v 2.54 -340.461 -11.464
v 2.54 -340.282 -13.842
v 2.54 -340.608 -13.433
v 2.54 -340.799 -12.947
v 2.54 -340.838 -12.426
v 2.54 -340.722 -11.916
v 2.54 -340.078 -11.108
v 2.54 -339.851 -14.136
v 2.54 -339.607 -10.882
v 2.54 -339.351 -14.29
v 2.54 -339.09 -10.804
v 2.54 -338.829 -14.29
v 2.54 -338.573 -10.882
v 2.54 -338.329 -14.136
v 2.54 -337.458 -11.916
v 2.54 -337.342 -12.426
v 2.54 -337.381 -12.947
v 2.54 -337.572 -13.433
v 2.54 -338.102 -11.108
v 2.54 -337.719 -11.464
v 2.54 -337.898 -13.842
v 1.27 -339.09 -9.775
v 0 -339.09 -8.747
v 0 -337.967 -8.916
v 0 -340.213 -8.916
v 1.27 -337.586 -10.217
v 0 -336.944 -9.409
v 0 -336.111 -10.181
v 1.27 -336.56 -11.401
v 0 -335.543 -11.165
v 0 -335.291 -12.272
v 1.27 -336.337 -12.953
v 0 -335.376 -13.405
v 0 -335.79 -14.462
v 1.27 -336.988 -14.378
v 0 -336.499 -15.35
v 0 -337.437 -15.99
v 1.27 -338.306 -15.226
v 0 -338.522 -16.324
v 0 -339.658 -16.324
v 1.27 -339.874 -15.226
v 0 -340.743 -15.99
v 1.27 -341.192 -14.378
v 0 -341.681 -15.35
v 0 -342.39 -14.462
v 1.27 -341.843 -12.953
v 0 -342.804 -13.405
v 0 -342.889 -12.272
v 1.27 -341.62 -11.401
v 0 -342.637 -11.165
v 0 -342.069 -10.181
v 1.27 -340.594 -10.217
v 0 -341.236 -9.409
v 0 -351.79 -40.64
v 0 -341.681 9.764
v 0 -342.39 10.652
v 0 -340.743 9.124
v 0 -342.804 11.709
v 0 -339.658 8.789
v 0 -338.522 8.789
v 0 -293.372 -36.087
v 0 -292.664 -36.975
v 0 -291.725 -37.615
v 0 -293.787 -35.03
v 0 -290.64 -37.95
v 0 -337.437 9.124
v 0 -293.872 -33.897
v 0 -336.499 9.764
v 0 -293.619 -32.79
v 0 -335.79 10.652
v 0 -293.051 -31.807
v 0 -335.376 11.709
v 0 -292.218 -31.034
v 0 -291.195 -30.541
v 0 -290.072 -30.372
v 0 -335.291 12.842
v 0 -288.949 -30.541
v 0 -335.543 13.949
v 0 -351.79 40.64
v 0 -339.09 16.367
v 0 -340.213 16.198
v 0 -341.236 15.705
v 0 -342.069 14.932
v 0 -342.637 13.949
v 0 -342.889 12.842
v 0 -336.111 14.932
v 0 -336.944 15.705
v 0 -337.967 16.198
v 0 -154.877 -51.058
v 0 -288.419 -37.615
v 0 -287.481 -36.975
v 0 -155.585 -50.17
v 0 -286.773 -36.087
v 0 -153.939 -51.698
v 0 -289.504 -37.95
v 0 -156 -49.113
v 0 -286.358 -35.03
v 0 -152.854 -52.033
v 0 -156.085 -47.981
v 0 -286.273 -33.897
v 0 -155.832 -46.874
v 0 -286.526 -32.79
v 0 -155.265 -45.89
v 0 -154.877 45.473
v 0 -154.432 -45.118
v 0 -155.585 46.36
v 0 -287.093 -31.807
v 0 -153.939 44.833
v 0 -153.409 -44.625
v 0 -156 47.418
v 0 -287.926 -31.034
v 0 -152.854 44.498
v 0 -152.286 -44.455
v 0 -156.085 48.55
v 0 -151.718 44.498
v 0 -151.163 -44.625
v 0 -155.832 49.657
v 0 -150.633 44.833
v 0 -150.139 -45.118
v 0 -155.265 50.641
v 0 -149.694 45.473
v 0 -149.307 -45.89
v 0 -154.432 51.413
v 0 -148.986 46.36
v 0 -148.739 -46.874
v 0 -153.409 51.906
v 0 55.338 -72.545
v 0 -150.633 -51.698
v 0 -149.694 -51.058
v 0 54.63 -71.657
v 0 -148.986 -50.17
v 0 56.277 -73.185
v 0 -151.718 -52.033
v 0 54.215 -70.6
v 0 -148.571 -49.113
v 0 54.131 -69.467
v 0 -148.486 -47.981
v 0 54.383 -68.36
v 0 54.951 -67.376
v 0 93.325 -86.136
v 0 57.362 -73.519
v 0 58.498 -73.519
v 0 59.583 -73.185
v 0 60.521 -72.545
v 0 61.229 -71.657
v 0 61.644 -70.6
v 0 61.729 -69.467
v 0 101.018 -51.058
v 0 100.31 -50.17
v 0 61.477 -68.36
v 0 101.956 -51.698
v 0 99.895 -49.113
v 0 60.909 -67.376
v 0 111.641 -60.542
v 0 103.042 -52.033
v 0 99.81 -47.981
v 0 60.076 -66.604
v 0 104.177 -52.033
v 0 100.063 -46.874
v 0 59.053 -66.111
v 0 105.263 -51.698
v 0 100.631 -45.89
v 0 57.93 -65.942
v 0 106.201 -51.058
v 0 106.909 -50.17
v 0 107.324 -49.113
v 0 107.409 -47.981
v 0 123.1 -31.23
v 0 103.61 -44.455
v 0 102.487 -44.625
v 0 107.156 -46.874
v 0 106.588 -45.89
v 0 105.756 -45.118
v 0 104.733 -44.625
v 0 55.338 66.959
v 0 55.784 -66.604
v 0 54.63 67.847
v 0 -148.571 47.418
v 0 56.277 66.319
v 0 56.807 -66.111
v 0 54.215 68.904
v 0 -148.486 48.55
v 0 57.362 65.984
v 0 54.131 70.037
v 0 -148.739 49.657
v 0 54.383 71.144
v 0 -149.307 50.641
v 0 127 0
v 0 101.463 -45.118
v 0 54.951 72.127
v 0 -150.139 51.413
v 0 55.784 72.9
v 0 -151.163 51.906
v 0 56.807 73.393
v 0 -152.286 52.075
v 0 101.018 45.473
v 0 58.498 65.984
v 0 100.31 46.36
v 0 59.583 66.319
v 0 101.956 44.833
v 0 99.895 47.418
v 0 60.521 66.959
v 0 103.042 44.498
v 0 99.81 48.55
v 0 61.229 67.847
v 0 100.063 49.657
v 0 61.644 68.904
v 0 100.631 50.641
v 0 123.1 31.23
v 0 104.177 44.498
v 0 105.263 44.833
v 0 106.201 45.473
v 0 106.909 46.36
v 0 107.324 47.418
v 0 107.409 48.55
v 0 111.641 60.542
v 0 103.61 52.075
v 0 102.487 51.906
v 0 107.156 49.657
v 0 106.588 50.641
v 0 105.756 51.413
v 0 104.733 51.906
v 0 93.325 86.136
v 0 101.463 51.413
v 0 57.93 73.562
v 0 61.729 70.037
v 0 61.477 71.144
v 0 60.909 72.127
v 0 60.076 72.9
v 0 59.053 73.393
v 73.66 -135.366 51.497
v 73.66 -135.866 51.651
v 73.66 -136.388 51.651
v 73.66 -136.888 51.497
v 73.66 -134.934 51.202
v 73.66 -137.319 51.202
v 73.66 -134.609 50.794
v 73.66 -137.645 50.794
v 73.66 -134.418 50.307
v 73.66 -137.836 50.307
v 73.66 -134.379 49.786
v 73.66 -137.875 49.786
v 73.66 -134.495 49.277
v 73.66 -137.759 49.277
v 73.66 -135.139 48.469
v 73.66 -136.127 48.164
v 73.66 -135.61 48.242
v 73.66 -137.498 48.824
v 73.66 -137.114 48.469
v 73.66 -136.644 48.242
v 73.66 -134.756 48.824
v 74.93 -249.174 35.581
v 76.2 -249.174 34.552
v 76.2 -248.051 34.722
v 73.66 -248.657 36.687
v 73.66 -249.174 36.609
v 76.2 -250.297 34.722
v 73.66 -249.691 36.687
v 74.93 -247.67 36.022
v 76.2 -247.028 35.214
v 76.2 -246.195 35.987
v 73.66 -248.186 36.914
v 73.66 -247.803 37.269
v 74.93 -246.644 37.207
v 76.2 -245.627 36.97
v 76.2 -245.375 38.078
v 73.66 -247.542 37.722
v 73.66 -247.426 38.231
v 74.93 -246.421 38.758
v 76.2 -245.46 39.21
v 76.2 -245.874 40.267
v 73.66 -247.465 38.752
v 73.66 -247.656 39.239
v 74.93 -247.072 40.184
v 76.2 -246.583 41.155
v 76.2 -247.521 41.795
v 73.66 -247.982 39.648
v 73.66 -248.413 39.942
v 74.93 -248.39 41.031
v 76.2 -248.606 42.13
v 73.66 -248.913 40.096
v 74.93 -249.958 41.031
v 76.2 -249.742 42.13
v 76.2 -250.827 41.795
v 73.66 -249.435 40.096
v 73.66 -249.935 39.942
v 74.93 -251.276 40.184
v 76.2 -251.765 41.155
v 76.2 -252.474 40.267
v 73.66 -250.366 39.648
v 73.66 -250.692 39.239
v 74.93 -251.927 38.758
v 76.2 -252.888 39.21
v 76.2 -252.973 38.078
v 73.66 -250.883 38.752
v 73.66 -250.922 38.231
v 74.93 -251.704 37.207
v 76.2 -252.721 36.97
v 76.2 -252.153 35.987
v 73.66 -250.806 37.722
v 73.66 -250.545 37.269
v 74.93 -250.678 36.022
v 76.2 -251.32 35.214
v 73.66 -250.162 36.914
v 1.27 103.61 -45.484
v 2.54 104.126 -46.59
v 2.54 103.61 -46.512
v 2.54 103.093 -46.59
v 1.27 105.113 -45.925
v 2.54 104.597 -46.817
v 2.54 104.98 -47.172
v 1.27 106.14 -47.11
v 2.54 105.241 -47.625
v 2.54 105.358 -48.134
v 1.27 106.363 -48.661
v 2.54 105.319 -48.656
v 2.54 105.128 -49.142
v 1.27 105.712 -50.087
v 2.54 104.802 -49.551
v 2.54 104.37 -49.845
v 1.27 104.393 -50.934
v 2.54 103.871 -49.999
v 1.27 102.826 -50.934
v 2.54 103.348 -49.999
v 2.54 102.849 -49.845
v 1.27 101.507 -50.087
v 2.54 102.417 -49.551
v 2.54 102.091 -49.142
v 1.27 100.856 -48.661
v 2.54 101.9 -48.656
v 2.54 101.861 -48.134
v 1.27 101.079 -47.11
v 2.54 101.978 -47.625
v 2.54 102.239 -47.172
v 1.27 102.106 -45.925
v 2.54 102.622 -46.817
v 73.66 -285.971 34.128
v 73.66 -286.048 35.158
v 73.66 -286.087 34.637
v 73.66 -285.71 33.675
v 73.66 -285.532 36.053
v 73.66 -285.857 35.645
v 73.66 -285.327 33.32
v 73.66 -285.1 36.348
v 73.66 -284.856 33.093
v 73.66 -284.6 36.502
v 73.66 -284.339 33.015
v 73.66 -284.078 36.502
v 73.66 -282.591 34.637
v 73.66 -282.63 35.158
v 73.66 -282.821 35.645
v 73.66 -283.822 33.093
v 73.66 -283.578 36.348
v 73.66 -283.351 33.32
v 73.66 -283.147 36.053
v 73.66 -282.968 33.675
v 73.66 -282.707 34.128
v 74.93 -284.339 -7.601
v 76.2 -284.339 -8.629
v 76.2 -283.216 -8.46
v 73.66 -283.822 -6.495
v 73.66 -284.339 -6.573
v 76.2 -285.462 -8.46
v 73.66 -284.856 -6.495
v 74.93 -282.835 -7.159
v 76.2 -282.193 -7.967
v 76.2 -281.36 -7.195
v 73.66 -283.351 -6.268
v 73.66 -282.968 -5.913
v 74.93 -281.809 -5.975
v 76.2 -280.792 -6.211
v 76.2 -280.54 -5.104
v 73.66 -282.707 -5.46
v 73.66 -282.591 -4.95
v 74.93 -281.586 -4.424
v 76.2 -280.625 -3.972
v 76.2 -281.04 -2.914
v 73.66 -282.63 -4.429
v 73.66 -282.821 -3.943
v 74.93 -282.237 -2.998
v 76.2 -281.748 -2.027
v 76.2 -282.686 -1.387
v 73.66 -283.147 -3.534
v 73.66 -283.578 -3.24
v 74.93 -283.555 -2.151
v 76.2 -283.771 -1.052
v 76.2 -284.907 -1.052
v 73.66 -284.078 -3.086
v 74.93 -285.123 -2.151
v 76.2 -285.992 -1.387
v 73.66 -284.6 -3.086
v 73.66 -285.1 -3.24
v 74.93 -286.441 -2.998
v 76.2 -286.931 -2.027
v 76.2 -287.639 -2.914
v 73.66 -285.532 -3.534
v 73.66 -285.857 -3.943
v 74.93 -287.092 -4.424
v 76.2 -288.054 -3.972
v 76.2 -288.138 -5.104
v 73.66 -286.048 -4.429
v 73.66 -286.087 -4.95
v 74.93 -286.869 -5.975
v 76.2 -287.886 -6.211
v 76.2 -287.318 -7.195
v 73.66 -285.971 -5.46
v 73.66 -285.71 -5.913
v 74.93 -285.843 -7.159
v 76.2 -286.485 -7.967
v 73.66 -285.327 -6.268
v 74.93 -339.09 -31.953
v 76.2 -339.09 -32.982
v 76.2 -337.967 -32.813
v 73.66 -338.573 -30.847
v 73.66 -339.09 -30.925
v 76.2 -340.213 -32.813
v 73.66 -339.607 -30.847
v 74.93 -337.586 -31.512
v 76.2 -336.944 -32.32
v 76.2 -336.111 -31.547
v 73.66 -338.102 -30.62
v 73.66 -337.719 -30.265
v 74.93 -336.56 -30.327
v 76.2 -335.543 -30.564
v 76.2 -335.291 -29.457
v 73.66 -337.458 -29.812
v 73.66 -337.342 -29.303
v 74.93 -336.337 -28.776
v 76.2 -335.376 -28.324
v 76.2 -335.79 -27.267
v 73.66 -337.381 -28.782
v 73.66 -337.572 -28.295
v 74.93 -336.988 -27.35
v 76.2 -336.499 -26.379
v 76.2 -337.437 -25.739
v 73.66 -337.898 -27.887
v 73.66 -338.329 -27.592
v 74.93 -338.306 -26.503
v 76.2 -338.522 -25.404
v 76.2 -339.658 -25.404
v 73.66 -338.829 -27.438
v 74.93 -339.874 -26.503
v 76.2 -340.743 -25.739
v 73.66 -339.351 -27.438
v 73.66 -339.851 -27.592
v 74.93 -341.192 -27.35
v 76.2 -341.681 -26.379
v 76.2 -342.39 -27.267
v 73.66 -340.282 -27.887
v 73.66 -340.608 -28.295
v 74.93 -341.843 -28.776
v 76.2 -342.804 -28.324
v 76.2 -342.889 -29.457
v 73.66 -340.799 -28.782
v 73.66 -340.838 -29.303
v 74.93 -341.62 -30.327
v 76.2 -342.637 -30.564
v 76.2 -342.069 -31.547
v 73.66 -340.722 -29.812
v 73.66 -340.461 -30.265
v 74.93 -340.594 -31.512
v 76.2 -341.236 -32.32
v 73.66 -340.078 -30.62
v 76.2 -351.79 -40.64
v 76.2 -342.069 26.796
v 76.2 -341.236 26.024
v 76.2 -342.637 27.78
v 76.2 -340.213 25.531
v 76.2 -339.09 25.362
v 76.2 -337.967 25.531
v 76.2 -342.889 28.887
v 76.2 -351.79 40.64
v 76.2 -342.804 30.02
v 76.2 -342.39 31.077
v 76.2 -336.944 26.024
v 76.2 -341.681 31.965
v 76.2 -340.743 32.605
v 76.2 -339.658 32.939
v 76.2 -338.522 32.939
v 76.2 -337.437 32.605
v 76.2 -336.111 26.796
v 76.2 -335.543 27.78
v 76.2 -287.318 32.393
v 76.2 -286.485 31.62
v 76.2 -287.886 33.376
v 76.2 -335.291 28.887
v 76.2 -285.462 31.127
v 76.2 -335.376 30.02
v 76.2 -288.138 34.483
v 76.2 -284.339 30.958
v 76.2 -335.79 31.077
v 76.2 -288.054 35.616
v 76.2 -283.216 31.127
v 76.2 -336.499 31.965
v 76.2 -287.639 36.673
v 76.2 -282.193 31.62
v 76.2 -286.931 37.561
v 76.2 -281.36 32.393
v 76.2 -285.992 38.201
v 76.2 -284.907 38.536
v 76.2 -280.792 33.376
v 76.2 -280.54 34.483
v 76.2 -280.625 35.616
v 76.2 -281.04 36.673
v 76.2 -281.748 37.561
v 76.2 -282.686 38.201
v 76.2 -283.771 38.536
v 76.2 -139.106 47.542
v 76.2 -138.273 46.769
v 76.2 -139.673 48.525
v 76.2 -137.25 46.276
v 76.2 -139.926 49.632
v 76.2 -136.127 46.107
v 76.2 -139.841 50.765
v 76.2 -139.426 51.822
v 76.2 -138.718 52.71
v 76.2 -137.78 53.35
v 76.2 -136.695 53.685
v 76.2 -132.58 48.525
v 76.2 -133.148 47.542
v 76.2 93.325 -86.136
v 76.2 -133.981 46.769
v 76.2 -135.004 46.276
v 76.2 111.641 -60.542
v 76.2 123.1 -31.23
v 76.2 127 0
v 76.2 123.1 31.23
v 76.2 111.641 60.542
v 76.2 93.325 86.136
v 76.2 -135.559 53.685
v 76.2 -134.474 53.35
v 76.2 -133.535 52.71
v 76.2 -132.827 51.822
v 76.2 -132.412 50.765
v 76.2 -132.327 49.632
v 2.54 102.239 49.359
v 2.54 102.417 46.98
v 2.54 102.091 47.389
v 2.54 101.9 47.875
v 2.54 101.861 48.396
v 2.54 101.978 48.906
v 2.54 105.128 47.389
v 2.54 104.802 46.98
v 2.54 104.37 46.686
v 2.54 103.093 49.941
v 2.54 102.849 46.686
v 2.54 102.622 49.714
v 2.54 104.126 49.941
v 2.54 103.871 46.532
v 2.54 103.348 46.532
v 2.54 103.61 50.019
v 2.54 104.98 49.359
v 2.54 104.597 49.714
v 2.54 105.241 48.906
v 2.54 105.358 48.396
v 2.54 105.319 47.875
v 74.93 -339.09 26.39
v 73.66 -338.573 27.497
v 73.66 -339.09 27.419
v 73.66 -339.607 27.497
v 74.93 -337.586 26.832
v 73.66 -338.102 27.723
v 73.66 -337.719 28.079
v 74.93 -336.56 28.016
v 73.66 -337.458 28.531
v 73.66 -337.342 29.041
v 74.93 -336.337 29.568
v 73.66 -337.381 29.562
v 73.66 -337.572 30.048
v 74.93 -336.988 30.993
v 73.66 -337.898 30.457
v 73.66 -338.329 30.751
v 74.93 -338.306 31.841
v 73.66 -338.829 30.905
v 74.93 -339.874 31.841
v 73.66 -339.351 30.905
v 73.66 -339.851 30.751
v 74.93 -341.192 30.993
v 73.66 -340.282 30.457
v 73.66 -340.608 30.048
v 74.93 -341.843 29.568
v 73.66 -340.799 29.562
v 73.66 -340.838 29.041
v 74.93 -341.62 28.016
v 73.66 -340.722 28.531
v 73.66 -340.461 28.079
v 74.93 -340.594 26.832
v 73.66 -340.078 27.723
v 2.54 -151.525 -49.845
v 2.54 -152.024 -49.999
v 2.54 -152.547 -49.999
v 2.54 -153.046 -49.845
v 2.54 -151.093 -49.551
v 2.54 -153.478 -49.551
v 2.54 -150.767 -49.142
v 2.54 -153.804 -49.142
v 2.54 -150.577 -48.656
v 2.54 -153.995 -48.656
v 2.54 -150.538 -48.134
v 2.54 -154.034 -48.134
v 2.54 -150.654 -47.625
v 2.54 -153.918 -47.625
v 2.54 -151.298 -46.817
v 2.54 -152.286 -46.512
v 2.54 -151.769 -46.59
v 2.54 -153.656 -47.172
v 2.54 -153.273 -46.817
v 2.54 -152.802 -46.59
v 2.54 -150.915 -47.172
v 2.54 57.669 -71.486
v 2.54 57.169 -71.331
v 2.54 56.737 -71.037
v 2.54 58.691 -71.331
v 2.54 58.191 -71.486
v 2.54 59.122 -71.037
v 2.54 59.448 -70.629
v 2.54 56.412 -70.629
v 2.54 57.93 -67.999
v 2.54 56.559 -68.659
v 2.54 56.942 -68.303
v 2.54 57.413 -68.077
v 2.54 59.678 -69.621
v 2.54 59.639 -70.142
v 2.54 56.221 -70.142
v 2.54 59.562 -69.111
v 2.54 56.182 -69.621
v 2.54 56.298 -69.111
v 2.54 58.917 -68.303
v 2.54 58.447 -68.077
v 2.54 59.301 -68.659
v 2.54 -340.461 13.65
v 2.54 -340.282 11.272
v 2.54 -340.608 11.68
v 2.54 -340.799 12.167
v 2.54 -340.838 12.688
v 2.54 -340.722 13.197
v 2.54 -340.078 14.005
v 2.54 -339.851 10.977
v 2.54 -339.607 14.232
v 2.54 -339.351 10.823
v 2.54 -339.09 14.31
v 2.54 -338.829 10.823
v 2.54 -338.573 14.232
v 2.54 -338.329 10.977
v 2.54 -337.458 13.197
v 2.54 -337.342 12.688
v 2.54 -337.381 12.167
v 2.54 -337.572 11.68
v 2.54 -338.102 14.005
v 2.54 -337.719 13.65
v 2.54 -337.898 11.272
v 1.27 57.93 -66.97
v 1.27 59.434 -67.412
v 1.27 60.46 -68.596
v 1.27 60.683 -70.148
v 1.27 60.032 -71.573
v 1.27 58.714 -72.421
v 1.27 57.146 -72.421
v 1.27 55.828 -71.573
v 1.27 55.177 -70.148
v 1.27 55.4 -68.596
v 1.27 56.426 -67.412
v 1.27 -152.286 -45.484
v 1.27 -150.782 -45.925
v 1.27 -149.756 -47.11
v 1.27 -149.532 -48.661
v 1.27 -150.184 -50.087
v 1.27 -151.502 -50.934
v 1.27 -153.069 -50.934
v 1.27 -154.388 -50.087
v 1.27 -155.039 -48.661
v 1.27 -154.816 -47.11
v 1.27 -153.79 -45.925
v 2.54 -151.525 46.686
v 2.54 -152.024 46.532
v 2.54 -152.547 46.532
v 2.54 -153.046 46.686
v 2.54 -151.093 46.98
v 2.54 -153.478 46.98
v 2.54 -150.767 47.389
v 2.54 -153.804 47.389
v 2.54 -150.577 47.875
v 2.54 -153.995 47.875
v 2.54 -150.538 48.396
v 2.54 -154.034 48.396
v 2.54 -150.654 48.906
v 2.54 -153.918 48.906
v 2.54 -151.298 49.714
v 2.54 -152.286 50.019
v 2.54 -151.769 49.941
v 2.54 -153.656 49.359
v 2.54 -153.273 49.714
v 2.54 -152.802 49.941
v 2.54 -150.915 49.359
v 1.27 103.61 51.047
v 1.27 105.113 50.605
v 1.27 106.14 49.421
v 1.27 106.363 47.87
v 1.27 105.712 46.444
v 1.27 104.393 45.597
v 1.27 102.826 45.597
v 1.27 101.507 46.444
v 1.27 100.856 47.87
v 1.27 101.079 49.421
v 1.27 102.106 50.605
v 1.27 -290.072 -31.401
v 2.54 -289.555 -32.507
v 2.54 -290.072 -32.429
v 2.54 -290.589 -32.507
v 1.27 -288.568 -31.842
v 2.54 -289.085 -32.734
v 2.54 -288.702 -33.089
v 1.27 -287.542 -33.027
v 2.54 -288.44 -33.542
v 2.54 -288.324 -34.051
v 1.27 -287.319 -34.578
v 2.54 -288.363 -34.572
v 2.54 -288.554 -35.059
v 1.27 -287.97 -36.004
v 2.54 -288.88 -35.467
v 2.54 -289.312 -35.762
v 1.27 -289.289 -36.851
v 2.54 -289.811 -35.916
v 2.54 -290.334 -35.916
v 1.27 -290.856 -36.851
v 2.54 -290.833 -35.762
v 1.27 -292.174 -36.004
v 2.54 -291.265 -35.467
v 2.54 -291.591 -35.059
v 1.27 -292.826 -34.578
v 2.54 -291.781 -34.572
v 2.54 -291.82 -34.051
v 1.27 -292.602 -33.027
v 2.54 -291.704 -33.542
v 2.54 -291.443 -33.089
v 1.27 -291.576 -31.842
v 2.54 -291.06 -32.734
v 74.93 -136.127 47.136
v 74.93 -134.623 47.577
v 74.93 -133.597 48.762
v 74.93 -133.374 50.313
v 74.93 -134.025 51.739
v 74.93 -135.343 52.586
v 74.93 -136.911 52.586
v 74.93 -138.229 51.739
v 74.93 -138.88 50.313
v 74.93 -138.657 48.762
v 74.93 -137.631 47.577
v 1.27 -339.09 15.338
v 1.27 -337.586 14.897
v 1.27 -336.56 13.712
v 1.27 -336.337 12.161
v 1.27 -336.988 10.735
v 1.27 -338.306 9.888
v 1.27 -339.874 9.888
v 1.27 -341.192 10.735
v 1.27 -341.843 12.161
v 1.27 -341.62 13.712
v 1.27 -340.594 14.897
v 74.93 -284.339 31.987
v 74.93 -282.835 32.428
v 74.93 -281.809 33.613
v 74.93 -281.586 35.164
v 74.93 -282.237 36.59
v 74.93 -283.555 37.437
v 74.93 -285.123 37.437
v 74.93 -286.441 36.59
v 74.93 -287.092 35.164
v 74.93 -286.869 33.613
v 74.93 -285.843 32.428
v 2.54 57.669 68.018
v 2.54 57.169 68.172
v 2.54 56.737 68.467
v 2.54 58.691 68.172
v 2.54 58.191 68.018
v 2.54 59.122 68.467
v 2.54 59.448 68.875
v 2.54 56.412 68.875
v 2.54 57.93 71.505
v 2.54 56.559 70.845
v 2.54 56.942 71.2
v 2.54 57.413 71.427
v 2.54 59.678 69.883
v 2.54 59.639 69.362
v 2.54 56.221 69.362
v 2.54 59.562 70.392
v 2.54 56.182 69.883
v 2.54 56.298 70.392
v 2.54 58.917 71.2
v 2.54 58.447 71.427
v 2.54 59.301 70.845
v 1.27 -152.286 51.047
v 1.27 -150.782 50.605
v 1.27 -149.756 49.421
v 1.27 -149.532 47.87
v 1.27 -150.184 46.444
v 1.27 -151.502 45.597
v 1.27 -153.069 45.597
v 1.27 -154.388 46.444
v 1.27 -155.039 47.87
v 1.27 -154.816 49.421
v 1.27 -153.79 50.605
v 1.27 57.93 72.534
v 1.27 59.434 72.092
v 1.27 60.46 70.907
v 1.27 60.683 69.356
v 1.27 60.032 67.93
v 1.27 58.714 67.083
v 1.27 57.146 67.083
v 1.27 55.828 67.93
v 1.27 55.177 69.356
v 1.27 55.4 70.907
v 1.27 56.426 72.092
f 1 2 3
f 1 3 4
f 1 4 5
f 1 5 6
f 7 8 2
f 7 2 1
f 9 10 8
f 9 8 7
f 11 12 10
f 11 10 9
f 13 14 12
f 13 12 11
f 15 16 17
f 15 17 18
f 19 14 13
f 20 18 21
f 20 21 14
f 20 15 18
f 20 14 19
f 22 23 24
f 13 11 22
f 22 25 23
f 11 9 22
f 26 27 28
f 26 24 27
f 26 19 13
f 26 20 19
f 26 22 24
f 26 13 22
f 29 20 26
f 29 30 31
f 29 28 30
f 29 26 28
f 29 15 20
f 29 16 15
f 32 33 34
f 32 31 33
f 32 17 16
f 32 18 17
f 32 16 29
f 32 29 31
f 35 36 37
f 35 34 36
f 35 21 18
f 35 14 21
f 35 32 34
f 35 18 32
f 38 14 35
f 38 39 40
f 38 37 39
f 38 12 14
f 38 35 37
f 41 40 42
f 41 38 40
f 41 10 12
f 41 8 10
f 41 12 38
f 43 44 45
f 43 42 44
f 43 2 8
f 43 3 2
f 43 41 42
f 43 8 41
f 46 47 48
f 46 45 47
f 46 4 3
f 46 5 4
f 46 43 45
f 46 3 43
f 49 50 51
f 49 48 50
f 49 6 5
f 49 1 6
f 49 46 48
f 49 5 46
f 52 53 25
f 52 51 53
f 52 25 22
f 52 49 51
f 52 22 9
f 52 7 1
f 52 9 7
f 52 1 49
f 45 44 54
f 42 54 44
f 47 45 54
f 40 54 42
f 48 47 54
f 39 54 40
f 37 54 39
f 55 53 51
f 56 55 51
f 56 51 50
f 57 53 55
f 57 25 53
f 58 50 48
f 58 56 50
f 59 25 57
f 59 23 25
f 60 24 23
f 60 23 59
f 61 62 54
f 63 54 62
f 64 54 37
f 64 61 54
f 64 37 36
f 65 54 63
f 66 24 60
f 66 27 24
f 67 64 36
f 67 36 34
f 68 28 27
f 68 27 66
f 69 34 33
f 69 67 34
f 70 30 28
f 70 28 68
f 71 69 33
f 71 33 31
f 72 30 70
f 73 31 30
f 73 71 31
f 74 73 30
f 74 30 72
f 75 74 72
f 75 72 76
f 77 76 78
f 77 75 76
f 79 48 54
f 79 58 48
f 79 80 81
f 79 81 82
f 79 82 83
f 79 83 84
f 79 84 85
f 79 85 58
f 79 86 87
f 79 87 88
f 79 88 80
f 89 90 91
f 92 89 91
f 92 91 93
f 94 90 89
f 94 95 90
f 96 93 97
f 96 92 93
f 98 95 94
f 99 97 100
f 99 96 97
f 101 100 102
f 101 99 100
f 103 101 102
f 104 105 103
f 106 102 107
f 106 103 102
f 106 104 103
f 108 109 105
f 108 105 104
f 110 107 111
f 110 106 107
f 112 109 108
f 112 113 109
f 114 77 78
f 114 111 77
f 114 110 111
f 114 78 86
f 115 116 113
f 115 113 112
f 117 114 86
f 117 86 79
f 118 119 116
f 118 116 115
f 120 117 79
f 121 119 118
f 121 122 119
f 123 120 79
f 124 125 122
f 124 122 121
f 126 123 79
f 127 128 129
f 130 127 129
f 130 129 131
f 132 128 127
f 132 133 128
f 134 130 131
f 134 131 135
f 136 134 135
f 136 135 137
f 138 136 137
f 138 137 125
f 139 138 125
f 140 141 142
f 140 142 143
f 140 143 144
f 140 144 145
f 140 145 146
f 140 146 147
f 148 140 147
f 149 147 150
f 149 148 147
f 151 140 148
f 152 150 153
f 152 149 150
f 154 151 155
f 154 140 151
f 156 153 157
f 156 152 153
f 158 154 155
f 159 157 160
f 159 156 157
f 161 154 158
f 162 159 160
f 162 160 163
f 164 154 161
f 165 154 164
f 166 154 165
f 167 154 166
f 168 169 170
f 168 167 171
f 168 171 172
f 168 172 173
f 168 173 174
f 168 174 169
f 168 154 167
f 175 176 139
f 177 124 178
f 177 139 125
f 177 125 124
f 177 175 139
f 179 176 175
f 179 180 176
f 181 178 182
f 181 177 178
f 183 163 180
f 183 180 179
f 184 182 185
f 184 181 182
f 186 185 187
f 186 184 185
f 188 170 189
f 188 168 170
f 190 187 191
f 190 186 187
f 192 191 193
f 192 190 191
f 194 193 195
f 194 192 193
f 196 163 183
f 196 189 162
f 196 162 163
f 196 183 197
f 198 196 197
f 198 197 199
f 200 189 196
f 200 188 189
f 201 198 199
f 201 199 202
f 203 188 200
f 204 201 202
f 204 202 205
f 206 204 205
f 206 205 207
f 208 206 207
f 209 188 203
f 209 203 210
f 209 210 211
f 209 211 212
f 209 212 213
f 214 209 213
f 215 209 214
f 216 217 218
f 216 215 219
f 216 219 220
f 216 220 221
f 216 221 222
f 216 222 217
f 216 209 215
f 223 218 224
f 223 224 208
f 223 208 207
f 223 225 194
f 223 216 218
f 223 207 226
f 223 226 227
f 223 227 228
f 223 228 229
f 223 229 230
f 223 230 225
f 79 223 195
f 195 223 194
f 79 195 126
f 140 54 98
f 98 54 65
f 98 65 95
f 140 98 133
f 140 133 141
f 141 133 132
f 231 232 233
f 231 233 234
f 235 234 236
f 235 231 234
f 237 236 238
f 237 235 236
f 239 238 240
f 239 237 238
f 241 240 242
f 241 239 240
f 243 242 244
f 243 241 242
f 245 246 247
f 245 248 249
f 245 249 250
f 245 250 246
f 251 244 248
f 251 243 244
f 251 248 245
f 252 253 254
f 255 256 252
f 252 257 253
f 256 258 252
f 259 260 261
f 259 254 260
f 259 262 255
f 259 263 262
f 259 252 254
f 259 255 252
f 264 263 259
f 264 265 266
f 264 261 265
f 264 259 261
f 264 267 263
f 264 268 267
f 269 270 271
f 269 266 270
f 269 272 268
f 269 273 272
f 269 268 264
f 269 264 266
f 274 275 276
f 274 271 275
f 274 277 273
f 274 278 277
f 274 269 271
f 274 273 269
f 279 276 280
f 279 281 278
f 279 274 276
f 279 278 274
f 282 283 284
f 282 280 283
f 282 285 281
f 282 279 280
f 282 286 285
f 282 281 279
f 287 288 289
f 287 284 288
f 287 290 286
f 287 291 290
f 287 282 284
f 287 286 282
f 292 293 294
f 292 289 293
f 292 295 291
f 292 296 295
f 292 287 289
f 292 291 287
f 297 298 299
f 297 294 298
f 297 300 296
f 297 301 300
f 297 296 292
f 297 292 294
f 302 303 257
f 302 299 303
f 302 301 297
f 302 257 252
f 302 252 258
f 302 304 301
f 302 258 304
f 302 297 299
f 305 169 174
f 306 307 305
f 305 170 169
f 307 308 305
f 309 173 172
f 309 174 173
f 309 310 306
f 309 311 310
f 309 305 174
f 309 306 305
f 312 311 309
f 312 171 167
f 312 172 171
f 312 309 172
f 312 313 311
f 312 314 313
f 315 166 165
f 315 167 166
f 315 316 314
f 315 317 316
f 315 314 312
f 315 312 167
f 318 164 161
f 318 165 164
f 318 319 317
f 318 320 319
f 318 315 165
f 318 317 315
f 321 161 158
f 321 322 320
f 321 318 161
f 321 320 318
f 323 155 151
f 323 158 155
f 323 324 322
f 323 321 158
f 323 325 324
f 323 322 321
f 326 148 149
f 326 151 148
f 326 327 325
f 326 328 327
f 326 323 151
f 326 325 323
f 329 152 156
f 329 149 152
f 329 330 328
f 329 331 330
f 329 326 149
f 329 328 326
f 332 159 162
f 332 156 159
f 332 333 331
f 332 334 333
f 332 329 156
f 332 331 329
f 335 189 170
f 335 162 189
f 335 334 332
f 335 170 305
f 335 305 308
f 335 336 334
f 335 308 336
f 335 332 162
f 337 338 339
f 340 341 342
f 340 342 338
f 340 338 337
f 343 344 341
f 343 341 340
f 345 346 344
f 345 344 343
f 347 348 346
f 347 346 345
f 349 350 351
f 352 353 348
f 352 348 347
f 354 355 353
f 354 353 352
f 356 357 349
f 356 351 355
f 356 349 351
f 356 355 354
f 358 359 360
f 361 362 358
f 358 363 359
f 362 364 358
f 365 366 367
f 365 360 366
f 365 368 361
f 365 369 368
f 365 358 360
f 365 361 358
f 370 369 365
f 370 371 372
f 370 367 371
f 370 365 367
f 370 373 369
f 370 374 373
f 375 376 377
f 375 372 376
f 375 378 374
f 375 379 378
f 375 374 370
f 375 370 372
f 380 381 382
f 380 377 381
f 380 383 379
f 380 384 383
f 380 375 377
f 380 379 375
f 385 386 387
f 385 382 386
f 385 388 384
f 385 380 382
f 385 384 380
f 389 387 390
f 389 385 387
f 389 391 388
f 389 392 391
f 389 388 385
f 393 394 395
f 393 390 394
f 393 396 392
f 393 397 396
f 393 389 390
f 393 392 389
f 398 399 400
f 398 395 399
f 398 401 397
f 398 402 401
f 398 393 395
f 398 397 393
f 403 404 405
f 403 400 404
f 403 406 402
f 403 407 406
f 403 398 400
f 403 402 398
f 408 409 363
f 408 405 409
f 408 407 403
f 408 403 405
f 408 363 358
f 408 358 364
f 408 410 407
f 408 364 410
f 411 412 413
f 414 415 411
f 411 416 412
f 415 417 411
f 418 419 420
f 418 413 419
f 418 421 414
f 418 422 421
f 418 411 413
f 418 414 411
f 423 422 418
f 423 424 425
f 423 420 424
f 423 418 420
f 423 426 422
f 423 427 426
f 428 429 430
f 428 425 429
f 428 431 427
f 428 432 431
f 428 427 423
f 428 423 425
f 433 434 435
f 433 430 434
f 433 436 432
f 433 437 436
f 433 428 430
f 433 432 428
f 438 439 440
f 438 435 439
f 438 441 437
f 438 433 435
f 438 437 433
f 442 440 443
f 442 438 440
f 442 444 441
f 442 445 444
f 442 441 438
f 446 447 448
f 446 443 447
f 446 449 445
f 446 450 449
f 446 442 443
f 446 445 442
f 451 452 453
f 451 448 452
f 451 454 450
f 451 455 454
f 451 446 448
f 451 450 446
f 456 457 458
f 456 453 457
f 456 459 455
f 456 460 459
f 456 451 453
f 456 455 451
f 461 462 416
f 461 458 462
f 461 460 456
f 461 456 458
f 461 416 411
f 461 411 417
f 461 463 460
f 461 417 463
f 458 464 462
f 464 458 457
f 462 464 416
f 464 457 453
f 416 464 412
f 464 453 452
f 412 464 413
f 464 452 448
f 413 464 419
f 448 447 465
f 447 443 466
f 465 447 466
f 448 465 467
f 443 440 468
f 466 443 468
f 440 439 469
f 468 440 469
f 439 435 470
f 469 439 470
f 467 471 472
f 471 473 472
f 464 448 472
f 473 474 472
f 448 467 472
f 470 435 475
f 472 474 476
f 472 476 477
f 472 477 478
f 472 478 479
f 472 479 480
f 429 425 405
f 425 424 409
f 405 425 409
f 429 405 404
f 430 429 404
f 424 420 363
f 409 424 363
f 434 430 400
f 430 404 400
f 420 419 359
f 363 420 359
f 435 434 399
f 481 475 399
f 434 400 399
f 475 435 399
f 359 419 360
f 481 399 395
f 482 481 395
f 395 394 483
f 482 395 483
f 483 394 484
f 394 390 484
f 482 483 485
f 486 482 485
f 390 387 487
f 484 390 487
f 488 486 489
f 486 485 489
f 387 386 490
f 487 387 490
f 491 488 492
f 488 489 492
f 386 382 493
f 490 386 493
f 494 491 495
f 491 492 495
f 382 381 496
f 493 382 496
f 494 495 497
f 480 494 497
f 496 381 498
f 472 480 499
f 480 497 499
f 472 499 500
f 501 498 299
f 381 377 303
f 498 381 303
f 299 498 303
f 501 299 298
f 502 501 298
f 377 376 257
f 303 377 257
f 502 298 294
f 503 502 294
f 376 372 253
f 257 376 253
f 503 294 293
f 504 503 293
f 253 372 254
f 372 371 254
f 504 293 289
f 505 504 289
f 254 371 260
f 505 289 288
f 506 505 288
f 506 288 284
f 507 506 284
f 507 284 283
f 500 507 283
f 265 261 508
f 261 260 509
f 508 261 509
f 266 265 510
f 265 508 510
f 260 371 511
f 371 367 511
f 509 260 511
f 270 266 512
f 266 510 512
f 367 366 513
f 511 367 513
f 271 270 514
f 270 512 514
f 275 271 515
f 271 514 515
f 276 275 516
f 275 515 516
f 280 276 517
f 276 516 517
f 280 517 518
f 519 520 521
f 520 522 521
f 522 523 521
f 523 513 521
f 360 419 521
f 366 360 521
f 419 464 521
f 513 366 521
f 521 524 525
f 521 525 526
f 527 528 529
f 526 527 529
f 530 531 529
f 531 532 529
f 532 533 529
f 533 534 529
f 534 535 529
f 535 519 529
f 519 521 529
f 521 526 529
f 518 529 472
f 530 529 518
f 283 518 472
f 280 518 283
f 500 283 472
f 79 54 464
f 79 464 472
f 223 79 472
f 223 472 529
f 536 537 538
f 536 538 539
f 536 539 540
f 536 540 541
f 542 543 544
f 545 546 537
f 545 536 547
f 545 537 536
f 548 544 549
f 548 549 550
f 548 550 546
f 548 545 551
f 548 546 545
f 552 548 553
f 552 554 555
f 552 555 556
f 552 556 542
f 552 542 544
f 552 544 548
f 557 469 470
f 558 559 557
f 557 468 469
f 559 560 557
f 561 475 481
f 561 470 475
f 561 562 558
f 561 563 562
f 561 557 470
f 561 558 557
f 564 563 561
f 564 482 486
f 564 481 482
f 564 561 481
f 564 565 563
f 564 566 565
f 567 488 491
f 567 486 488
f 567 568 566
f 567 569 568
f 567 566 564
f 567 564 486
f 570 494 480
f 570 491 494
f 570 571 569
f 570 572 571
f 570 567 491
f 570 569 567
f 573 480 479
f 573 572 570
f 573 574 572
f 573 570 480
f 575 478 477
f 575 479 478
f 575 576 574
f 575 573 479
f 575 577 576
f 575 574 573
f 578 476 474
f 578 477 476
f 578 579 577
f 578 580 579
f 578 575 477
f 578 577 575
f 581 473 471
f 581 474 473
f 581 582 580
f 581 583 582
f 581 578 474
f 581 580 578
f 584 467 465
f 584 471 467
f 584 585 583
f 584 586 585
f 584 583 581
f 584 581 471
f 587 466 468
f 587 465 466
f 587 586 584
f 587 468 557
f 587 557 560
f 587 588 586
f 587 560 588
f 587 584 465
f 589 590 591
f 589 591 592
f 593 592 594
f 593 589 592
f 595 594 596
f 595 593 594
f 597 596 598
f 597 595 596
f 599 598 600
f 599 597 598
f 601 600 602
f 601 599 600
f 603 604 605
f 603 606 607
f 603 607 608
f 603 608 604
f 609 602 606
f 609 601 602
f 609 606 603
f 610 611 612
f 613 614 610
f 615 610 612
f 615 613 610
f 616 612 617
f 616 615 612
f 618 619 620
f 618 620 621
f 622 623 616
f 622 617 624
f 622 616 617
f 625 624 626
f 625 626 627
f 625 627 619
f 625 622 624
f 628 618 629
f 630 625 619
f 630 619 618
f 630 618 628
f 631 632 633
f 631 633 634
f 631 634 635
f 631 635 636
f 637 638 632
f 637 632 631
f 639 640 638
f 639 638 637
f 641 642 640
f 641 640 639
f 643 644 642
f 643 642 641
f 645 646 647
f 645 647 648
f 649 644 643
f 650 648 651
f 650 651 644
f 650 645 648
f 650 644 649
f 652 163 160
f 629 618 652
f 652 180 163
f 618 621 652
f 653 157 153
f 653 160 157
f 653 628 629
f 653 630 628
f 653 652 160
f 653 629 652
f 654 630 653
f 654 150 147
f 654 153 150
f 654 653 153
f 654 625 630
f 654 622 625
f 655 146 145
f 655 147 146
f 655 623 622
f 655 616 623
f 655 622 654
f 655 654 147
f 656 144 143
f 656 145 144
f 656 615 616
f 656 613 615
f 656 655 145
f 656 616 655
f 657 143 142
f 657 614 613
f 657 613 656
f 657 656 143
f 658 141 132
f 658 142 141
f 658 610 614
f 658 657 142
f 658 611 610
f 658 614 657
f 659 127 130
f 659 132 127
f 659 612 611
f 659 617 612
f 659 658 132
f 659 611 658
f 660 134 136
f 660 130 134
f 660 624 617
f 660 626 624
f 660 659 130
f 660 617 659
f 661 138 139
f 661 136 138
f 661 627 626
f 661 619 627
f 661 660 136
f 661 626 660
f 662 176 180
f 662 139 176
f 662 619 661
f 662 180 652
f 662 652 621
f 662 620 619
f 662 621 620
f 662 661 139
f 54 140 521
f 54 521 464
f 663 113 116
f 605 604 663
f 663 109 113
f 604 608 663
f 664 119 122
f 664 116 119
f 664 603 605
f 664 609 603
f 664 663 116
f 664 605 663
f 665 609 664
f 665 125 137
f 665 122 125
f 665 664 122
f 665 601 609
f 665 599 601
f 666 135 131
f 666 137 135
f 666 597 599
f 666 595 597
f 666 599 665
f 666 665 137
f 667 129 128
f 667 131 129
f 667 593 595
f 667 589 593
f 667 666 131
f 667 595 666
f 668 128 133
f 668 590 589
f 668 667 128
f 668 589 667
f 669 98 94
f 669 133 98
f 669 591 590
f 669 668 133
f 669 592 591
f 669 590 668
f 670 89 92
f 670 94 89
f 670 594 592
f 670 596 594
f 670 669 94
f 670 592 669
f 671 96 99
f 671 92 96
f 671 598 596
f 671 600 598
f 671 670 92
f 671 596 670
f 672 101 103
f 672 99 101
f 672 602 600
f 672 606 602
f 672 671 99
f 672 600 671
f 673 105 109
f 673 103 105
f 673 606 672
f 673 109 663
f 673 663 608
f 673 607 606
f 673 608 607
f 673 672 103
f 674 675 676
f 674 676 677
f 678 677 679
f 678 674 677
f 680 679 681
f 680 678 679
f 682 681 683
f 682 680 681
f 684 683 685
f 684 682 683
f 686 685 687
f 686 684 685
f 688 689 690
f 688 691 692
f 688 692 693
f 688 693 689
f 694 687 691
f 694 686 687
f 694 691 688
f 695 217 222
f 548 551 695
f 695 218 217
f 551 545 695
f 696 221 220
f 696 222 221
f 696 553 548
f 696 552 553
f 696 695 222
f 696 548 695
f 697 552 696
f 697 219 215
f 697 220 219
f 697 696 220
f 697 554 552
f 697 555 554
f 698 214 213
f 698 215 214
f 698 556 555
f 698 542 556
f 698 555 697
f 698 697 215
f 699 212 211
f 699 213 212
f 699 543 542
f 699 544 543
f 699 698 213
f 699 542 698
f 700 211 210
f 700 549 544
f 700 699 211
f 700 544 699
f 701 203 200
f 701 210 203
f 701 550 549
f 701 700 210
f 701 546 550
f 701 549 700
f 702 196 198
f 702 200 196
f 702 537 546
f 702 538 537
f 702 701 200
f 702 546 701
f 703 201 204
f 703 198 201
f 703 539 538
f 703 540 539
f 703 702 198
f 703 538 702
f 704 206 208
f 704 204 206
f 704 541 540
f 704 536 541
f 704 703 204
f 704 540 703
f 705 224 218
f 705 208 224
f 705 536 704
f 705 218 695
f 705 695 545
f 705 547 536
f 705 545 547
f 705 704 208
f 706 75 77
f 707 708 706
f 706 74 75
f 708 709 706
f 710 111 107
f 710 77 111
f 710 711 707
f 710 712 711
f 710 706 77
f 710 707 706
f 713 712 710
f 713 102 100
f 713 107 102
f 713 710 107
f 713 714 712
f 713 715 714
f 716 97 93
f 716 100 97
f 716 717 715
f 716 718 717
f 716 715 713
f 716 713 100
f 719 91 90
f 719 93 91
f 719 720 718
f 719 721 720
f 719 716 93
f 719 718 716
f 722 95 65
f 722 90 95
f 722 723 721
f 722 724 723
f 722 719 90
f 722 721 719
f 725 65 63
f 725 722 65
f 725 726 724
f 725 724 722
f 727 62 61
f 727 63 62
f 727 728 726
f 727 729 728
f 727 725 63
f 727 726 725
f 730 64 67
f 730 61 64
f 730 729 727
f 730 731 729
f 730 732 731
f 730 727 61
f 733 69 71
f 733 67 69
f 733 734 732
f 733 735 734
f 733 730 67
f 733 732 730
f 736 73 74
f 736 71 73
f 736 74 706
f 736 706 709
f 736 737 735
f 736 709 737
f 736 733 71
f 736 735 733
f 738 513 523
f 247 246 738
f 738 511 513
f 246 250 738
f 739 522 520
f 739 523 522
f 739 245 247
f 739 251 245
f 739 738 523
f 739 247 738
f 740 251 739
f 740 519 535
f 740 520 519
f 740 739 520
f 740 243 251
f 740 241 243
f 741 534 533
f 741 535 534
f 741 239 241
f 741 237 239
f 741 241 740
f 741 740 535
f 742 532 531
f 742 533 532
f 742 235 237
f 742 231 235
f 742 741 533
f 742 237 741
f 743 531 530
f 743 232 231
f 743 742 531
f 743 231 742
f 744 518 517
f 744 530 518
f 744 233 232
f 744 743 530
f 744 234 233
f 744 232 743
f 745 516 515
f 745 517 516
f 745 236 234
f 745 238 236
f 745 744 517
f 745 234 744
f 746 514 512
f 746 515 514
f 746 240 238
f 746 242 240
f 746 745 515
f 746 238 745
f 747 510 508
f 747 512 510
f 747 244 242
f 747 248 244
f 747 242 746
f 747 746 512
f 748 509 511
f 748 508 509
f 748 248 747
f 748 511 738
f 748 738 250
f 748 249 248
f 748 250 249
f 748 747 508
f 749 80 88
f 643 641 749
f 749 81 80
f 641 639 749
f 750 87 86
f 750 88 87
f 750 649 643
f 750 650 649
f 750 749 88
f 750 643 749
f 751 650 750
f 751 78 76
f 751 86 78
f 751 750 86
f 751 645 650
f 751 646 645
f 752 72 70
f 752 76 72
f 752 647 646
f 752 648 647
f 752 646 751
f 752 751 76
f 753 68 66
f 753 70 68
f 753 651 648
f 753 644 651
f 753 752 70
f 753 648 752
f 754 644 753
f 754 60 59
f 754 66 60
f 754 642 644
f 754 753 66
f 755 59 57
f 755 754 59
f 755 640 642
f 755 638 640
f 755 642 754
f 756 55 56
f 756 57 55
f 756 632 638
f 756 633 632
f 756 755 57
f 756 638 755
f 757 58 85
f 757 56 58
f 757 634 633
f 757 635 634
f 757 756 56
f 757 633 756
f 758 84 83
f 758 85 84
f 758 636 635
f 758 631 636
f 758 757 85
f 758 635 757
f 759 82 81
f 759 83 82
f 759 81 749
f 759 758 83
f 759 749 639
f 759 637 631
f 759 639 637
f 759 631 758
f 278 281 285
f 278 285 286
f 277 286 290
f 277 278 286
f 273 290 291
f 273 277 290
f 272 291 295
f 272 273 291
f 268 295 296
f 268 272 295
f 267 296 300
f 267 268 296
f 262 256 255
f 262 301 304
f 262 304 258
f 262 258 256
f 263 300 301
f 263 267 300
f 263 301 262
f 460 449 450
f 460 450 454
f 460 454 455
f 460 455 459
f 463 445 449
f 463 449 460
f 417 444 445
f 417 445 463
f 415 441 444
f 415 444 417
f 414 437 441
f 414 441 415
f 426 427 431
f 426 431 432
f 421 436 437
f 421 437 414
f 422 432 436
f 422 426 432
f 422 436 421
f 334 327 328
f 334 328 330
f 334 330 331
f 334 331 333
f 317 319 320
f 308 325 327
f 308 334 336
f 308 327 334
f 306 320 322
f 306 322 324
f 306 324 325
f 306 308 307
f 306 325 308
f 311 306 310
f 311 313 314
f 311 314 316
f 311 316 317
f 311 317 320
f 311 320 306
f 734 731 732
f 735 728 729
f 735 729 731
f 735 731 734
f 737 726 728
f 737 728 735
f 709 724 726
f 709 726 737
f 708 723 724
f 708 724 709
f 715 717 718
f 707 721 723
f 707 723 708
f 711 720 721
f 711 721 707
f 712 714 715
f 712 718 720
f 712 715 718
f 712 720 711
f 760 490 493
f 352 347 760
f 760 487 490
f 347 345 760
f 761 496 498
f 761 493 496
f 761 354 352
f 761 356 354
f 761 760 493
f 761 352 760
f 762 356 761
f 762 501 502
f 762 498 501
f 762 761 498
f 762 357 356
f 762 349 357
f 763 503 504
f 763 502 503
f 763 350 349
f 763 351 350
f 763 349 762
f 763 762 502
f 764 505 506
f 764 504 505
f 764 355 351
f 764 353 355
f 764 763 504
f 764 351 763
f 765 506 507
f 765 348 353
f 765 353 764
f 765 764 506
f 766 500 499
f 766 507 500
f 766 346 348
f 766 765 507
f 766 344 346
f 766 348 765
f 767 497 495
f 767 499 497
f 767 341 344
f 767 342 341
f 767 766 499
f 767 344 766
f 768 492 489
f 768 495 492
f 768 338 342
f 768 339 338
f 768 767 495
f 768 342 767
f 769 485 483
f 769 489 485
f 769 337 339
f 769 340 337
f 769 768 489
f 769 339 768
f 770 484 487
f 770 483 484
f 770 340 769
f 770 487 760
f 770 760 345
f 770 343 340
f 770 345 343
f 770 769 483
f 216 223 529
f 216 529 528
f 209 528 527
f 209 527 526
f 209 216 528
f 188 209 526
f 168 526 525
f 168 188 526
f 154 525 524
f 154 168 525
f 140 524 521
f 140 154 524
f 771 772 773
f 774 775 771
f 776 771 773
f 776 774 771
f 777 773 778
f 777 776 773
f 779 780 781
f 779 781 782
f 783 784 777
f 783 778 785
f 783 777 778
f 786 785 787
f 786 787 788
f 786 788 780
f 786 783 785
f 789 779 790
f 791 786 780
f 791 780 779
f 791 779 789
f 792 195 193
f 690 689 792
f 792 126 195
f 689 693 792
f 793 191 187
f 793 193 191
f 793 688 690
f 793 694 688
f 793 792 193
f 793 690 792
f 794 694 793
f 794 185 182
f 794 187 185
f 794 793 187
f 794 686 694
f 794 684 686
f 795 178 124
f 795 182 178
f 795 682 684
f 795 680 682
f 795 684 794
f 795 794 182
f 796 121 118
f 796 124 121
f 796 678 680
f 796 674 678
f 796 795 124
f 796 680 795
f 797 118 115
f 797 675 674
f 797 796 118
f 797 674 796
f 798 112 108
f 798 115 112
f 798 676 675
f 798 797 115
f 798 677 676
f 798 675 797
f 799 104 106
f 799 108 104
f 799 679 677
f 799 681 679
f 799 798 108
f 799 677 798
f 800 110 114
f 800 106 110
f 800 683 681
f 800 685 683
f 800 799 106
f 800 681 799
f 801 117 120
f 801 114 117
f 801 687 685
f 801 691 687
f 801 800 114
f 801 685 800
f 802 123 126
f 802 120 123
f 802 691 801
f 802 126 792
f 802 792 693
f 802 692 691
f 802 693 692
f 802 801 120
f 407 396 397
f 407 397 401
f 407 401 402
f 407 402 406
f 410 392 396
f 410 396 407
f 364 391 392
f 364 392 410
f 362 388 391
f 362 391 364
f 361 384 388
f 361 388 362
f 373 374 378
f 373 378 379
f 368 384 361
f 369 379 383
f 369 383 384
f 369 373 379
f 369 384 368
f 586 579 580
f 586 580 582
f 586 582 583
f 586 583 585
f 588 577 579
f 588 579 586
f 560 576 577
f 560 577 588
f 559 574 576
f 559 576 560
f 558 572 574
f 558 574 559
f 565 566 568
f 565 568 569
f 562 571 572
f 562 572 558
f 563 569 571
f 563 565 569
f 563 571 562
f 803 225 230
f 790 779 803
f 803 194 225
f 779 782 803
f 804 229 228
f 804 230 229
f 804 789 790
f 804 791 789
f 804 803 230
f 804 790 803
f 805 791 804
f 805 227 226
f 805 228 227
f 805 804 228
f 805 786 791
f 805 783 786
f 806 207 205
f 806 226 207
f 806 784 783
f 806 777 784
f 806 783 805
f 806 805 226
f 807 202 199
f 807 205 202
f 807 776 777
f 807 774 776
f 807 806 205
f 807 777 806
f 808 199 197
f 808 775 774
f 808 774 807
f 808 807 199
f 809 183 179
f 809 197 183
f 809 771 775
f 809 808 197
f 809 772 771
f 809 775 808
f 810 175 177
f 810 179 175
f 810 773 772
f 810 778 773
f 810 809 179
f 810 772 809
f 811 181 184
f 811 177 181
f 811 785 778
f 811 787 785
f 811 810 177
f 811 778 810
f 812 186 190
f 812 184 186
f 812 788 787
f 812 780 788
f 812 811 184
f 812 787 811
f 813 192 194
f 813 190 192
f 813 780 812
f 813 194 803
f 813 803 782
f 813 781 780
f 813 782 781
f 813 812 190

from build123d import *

# Parameters (mm, degrees)
SALIENTE_EXTRUIR1_DEPTH = 76.2
CROQUIS4_R              = 3.81
CORTAR_EXTRUIR1_DEPTH   = 2.54
CORTAR_EXTRUIR1_TAPER   = 39
CROQUIS5_R              = 3.81
CORTAR_EXTRUIR2_DEPTH   = 2.54
CORTAR_EXTRUIR2_TAPER   = 39


with BuildPart() as part:
    # Croquis1 → Saliente-Extruir1 (new body)
    with BuildSketch(Plane(origin=(0, 0, 0), x_dir=(0, 0, -1), z_dir=(1, 0, 0))):
        with BuildLine():
            Line((-40.64, -351.79000001), (-86.135923686, 93.325251946))
            ThreePointArc((-86.135923686, 93.325251946), (0, 127), (86.135923686, 93.325251946))
            Line((86.135923686, 93.325251946), (40.64, -351.79000001))
            Line((40.64, -351.79000001), (-40.64, -351.79000001))
        make_face()
    extrude(amount=SALIENTE_EXTRUIR1_DEPTH)

    # Croquis4 → Cortar-Extruir1 (cut)
    with BuildSketch(Plane(origin=(76.2, 0, 0), x_dir=(0, 0, -1), z_dir=(1, 0, 0))):
        with Locations((-49.917099877, -136.126844727)):
            Circle(CROQUIS4_R)
        with Locations((-38.362373799, -249.174001321)):
            Circle(CROQUIS4_R)
        with Locations((-34.768096531, -284.339077712)):
            Circle(CROQUIS4_R)
        with Locations((-29.171919425, -339.09000001)):
            Circle(CROQUIS4_R)
        with Locations((29.171919425, -339.09000001)):
            Circle(CROQUIS4_R)
        with Locations((4.819460737, -284.339077712)):
            Circle(CROQUIS4_R)
    extrude(amount=-CORTAR_EXTRUIR1_DEPTH, taper=CORTAR_EXTRUIR1_TAPER, mode=Mode.SUBTRACT)

    # Croquis5 → Cortar-Extruir2 (cut)
    with BuildSketch(Plane.ZY):
        with Locations((-12.556850651, -339.09000001)):
            Circle(CROQUIS5_R)
        with Locations((12.556850651, -339.09000001)):
            Circle(CROQUIS5_R)
        with Locations((-34.182100121, -290.072249352)):
            Circle(CROQUIS5_R)
        with Locations((-48.265473167, -152.285748198)):
            Circle(CROQUIS5_R)
        with Locations((-69.751939629, 57.929874619)):
            Circle(CROQUIS5_R)
        with Locations((-48.265473167, 103.609527072)):
            Circle(CROQUIS5_R)
        with Locations((48.265473167, 103.609527072)):
            Circle(CROQUIS5_R)
        with Locations((69.751939629, 57.929874619)):
            Circle(CROQUIS5_R)
        with Locations((48.265473167, -152.285748198)):
            Circle(CROQUIS5_R)
    extrude(amount=-CORTAR_EXTRUIR2_DEPTH, taper=CORTAR_EXTRUIR2_TAPER, mode=Mode.SUBTRACT)


solid = part.part
